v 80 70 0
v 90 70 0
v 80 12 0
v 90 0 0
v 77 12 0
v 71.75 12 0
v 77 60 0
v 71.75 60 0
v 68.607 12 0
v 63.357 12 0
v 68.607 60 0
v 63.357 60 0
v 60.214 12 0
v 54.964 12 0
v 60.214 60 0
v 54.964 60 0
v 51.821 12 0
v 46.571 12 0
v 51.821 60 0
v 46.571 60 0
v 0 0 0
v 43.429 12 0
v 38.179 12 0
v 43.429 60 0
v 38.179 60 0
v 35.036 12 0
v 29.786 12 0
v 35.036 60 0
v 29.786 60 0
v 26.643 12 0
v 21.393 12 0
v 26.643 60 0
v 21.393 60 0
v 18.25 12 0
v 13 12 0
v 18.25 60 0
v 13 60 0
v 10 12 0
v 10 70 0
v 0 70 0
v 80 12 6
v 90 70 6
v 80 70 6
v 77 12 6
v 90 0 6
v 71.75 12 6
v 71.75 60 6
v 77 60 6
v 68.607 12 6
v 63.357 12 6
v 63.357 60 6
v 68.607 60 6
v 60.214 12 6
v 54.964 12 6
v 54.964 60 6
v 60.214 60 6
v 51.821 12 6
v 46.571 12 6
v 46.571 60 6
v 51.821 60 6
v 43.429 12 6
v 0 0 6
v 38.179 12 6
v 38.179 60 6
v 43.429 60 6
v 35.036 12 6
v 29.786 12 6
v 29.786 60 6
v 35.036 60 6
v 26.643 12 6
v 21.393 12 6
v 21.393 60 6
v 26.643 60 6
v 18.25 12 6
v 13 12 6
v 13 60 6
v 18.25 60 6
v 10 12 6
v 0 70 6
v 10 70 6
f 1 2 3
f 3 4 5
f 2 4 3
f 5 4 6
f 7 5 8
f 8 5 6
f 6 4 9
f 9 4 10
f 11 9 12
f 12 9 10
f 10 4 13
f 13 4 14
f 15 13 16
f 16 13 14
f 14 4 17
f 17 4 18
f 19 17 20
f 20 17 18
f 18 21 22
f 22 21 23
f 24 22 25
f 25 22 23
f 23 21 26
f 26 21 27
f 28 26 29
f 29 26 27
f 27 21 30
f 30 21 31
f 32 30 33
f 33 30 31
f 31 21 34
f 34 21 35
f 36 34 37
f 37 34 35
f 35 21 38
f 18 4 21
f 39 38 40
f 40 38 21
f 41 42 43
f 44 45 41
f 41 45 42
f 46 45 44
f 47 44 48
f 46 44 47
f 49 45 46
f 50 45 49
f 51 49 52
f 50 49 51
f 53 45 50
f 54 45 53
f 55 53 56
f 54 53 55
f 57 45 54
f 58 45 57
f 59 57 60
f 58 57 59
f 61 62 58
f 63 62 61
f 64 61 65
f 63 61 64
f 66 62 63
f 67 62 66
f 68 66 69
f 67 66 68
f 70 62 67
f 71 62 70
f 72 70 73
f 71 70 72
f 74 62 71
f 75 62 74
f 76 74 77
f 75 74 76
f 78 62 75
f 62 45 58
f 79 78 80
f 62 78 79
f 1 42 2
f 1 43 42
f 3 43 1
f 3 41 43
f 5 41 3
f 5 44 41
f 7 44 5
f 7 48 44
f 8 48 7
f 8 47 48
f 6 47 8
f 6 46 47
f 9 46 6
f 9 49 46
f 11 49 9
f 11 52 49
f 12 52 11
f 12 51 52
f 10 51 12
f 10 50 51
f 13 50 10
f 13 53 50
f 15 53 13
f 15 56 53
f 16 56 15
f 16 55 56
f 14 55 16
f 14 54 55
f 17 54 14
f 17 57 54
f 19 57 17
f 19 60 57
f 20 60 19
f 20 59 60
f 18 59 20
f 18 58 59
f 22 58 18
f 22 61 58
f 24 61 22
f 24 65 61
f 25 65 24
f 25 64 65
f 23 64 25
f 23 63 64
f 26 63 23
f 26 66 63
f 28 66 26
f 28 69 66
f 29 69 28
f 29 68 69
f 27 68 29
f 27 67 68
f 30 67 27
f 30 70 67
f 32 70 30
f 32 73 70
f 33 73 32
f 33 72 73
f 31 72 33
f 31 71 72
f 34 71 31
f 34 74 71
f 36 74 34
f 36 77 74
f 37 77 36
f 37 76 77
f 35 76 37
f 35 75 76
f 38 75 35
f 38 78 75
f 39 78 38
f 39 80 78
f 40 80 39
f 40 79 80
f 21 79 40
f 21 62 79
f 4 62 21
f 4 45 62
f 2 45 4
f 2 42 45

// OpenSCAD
$fn = 32;

// ----------------------------------------------------------------------
// Guard grille: 8 slats over a 90 x 70 mm plate
// ----------------------------------------------------------------------

// --- parameters (mm) ---
profile_height = 6;       // extrusion height
profile_points = 40;      // points of the closed outline

profile = [[0, 0], [90, 0], [90, 70], [80, 70], [80, 12], [77, 12], [77, 60], [71.75, 60], [71.75, 12], [68.607, 12], [68.607, 60], [63.357, 60], [63.357, 12], [60.214, 12], [60.214, 60], [54.964, 60], [54.964, 12], [51.821, 12], [51.821, 60], [46.571, 60], [46.571, 12], [43.429, 12], [43.429, 60], [38.179, 60], [38.179, 12], [35.036, 12], [35.036, 60], [29.786, 60], [29.786, 12], [26.643, 12], [26.643, 60], [21.393, 60], [21.393, 12], [18.25, 12], [18.25, 60], [13, 60], [13, 12], [10, 12], [10, 70], [0, 70]];  // single closed polygon, 40 points, counter clockwise

// --- the one profile operation ---
linear_extrude(height = profile_height) polygon(points = profile);
